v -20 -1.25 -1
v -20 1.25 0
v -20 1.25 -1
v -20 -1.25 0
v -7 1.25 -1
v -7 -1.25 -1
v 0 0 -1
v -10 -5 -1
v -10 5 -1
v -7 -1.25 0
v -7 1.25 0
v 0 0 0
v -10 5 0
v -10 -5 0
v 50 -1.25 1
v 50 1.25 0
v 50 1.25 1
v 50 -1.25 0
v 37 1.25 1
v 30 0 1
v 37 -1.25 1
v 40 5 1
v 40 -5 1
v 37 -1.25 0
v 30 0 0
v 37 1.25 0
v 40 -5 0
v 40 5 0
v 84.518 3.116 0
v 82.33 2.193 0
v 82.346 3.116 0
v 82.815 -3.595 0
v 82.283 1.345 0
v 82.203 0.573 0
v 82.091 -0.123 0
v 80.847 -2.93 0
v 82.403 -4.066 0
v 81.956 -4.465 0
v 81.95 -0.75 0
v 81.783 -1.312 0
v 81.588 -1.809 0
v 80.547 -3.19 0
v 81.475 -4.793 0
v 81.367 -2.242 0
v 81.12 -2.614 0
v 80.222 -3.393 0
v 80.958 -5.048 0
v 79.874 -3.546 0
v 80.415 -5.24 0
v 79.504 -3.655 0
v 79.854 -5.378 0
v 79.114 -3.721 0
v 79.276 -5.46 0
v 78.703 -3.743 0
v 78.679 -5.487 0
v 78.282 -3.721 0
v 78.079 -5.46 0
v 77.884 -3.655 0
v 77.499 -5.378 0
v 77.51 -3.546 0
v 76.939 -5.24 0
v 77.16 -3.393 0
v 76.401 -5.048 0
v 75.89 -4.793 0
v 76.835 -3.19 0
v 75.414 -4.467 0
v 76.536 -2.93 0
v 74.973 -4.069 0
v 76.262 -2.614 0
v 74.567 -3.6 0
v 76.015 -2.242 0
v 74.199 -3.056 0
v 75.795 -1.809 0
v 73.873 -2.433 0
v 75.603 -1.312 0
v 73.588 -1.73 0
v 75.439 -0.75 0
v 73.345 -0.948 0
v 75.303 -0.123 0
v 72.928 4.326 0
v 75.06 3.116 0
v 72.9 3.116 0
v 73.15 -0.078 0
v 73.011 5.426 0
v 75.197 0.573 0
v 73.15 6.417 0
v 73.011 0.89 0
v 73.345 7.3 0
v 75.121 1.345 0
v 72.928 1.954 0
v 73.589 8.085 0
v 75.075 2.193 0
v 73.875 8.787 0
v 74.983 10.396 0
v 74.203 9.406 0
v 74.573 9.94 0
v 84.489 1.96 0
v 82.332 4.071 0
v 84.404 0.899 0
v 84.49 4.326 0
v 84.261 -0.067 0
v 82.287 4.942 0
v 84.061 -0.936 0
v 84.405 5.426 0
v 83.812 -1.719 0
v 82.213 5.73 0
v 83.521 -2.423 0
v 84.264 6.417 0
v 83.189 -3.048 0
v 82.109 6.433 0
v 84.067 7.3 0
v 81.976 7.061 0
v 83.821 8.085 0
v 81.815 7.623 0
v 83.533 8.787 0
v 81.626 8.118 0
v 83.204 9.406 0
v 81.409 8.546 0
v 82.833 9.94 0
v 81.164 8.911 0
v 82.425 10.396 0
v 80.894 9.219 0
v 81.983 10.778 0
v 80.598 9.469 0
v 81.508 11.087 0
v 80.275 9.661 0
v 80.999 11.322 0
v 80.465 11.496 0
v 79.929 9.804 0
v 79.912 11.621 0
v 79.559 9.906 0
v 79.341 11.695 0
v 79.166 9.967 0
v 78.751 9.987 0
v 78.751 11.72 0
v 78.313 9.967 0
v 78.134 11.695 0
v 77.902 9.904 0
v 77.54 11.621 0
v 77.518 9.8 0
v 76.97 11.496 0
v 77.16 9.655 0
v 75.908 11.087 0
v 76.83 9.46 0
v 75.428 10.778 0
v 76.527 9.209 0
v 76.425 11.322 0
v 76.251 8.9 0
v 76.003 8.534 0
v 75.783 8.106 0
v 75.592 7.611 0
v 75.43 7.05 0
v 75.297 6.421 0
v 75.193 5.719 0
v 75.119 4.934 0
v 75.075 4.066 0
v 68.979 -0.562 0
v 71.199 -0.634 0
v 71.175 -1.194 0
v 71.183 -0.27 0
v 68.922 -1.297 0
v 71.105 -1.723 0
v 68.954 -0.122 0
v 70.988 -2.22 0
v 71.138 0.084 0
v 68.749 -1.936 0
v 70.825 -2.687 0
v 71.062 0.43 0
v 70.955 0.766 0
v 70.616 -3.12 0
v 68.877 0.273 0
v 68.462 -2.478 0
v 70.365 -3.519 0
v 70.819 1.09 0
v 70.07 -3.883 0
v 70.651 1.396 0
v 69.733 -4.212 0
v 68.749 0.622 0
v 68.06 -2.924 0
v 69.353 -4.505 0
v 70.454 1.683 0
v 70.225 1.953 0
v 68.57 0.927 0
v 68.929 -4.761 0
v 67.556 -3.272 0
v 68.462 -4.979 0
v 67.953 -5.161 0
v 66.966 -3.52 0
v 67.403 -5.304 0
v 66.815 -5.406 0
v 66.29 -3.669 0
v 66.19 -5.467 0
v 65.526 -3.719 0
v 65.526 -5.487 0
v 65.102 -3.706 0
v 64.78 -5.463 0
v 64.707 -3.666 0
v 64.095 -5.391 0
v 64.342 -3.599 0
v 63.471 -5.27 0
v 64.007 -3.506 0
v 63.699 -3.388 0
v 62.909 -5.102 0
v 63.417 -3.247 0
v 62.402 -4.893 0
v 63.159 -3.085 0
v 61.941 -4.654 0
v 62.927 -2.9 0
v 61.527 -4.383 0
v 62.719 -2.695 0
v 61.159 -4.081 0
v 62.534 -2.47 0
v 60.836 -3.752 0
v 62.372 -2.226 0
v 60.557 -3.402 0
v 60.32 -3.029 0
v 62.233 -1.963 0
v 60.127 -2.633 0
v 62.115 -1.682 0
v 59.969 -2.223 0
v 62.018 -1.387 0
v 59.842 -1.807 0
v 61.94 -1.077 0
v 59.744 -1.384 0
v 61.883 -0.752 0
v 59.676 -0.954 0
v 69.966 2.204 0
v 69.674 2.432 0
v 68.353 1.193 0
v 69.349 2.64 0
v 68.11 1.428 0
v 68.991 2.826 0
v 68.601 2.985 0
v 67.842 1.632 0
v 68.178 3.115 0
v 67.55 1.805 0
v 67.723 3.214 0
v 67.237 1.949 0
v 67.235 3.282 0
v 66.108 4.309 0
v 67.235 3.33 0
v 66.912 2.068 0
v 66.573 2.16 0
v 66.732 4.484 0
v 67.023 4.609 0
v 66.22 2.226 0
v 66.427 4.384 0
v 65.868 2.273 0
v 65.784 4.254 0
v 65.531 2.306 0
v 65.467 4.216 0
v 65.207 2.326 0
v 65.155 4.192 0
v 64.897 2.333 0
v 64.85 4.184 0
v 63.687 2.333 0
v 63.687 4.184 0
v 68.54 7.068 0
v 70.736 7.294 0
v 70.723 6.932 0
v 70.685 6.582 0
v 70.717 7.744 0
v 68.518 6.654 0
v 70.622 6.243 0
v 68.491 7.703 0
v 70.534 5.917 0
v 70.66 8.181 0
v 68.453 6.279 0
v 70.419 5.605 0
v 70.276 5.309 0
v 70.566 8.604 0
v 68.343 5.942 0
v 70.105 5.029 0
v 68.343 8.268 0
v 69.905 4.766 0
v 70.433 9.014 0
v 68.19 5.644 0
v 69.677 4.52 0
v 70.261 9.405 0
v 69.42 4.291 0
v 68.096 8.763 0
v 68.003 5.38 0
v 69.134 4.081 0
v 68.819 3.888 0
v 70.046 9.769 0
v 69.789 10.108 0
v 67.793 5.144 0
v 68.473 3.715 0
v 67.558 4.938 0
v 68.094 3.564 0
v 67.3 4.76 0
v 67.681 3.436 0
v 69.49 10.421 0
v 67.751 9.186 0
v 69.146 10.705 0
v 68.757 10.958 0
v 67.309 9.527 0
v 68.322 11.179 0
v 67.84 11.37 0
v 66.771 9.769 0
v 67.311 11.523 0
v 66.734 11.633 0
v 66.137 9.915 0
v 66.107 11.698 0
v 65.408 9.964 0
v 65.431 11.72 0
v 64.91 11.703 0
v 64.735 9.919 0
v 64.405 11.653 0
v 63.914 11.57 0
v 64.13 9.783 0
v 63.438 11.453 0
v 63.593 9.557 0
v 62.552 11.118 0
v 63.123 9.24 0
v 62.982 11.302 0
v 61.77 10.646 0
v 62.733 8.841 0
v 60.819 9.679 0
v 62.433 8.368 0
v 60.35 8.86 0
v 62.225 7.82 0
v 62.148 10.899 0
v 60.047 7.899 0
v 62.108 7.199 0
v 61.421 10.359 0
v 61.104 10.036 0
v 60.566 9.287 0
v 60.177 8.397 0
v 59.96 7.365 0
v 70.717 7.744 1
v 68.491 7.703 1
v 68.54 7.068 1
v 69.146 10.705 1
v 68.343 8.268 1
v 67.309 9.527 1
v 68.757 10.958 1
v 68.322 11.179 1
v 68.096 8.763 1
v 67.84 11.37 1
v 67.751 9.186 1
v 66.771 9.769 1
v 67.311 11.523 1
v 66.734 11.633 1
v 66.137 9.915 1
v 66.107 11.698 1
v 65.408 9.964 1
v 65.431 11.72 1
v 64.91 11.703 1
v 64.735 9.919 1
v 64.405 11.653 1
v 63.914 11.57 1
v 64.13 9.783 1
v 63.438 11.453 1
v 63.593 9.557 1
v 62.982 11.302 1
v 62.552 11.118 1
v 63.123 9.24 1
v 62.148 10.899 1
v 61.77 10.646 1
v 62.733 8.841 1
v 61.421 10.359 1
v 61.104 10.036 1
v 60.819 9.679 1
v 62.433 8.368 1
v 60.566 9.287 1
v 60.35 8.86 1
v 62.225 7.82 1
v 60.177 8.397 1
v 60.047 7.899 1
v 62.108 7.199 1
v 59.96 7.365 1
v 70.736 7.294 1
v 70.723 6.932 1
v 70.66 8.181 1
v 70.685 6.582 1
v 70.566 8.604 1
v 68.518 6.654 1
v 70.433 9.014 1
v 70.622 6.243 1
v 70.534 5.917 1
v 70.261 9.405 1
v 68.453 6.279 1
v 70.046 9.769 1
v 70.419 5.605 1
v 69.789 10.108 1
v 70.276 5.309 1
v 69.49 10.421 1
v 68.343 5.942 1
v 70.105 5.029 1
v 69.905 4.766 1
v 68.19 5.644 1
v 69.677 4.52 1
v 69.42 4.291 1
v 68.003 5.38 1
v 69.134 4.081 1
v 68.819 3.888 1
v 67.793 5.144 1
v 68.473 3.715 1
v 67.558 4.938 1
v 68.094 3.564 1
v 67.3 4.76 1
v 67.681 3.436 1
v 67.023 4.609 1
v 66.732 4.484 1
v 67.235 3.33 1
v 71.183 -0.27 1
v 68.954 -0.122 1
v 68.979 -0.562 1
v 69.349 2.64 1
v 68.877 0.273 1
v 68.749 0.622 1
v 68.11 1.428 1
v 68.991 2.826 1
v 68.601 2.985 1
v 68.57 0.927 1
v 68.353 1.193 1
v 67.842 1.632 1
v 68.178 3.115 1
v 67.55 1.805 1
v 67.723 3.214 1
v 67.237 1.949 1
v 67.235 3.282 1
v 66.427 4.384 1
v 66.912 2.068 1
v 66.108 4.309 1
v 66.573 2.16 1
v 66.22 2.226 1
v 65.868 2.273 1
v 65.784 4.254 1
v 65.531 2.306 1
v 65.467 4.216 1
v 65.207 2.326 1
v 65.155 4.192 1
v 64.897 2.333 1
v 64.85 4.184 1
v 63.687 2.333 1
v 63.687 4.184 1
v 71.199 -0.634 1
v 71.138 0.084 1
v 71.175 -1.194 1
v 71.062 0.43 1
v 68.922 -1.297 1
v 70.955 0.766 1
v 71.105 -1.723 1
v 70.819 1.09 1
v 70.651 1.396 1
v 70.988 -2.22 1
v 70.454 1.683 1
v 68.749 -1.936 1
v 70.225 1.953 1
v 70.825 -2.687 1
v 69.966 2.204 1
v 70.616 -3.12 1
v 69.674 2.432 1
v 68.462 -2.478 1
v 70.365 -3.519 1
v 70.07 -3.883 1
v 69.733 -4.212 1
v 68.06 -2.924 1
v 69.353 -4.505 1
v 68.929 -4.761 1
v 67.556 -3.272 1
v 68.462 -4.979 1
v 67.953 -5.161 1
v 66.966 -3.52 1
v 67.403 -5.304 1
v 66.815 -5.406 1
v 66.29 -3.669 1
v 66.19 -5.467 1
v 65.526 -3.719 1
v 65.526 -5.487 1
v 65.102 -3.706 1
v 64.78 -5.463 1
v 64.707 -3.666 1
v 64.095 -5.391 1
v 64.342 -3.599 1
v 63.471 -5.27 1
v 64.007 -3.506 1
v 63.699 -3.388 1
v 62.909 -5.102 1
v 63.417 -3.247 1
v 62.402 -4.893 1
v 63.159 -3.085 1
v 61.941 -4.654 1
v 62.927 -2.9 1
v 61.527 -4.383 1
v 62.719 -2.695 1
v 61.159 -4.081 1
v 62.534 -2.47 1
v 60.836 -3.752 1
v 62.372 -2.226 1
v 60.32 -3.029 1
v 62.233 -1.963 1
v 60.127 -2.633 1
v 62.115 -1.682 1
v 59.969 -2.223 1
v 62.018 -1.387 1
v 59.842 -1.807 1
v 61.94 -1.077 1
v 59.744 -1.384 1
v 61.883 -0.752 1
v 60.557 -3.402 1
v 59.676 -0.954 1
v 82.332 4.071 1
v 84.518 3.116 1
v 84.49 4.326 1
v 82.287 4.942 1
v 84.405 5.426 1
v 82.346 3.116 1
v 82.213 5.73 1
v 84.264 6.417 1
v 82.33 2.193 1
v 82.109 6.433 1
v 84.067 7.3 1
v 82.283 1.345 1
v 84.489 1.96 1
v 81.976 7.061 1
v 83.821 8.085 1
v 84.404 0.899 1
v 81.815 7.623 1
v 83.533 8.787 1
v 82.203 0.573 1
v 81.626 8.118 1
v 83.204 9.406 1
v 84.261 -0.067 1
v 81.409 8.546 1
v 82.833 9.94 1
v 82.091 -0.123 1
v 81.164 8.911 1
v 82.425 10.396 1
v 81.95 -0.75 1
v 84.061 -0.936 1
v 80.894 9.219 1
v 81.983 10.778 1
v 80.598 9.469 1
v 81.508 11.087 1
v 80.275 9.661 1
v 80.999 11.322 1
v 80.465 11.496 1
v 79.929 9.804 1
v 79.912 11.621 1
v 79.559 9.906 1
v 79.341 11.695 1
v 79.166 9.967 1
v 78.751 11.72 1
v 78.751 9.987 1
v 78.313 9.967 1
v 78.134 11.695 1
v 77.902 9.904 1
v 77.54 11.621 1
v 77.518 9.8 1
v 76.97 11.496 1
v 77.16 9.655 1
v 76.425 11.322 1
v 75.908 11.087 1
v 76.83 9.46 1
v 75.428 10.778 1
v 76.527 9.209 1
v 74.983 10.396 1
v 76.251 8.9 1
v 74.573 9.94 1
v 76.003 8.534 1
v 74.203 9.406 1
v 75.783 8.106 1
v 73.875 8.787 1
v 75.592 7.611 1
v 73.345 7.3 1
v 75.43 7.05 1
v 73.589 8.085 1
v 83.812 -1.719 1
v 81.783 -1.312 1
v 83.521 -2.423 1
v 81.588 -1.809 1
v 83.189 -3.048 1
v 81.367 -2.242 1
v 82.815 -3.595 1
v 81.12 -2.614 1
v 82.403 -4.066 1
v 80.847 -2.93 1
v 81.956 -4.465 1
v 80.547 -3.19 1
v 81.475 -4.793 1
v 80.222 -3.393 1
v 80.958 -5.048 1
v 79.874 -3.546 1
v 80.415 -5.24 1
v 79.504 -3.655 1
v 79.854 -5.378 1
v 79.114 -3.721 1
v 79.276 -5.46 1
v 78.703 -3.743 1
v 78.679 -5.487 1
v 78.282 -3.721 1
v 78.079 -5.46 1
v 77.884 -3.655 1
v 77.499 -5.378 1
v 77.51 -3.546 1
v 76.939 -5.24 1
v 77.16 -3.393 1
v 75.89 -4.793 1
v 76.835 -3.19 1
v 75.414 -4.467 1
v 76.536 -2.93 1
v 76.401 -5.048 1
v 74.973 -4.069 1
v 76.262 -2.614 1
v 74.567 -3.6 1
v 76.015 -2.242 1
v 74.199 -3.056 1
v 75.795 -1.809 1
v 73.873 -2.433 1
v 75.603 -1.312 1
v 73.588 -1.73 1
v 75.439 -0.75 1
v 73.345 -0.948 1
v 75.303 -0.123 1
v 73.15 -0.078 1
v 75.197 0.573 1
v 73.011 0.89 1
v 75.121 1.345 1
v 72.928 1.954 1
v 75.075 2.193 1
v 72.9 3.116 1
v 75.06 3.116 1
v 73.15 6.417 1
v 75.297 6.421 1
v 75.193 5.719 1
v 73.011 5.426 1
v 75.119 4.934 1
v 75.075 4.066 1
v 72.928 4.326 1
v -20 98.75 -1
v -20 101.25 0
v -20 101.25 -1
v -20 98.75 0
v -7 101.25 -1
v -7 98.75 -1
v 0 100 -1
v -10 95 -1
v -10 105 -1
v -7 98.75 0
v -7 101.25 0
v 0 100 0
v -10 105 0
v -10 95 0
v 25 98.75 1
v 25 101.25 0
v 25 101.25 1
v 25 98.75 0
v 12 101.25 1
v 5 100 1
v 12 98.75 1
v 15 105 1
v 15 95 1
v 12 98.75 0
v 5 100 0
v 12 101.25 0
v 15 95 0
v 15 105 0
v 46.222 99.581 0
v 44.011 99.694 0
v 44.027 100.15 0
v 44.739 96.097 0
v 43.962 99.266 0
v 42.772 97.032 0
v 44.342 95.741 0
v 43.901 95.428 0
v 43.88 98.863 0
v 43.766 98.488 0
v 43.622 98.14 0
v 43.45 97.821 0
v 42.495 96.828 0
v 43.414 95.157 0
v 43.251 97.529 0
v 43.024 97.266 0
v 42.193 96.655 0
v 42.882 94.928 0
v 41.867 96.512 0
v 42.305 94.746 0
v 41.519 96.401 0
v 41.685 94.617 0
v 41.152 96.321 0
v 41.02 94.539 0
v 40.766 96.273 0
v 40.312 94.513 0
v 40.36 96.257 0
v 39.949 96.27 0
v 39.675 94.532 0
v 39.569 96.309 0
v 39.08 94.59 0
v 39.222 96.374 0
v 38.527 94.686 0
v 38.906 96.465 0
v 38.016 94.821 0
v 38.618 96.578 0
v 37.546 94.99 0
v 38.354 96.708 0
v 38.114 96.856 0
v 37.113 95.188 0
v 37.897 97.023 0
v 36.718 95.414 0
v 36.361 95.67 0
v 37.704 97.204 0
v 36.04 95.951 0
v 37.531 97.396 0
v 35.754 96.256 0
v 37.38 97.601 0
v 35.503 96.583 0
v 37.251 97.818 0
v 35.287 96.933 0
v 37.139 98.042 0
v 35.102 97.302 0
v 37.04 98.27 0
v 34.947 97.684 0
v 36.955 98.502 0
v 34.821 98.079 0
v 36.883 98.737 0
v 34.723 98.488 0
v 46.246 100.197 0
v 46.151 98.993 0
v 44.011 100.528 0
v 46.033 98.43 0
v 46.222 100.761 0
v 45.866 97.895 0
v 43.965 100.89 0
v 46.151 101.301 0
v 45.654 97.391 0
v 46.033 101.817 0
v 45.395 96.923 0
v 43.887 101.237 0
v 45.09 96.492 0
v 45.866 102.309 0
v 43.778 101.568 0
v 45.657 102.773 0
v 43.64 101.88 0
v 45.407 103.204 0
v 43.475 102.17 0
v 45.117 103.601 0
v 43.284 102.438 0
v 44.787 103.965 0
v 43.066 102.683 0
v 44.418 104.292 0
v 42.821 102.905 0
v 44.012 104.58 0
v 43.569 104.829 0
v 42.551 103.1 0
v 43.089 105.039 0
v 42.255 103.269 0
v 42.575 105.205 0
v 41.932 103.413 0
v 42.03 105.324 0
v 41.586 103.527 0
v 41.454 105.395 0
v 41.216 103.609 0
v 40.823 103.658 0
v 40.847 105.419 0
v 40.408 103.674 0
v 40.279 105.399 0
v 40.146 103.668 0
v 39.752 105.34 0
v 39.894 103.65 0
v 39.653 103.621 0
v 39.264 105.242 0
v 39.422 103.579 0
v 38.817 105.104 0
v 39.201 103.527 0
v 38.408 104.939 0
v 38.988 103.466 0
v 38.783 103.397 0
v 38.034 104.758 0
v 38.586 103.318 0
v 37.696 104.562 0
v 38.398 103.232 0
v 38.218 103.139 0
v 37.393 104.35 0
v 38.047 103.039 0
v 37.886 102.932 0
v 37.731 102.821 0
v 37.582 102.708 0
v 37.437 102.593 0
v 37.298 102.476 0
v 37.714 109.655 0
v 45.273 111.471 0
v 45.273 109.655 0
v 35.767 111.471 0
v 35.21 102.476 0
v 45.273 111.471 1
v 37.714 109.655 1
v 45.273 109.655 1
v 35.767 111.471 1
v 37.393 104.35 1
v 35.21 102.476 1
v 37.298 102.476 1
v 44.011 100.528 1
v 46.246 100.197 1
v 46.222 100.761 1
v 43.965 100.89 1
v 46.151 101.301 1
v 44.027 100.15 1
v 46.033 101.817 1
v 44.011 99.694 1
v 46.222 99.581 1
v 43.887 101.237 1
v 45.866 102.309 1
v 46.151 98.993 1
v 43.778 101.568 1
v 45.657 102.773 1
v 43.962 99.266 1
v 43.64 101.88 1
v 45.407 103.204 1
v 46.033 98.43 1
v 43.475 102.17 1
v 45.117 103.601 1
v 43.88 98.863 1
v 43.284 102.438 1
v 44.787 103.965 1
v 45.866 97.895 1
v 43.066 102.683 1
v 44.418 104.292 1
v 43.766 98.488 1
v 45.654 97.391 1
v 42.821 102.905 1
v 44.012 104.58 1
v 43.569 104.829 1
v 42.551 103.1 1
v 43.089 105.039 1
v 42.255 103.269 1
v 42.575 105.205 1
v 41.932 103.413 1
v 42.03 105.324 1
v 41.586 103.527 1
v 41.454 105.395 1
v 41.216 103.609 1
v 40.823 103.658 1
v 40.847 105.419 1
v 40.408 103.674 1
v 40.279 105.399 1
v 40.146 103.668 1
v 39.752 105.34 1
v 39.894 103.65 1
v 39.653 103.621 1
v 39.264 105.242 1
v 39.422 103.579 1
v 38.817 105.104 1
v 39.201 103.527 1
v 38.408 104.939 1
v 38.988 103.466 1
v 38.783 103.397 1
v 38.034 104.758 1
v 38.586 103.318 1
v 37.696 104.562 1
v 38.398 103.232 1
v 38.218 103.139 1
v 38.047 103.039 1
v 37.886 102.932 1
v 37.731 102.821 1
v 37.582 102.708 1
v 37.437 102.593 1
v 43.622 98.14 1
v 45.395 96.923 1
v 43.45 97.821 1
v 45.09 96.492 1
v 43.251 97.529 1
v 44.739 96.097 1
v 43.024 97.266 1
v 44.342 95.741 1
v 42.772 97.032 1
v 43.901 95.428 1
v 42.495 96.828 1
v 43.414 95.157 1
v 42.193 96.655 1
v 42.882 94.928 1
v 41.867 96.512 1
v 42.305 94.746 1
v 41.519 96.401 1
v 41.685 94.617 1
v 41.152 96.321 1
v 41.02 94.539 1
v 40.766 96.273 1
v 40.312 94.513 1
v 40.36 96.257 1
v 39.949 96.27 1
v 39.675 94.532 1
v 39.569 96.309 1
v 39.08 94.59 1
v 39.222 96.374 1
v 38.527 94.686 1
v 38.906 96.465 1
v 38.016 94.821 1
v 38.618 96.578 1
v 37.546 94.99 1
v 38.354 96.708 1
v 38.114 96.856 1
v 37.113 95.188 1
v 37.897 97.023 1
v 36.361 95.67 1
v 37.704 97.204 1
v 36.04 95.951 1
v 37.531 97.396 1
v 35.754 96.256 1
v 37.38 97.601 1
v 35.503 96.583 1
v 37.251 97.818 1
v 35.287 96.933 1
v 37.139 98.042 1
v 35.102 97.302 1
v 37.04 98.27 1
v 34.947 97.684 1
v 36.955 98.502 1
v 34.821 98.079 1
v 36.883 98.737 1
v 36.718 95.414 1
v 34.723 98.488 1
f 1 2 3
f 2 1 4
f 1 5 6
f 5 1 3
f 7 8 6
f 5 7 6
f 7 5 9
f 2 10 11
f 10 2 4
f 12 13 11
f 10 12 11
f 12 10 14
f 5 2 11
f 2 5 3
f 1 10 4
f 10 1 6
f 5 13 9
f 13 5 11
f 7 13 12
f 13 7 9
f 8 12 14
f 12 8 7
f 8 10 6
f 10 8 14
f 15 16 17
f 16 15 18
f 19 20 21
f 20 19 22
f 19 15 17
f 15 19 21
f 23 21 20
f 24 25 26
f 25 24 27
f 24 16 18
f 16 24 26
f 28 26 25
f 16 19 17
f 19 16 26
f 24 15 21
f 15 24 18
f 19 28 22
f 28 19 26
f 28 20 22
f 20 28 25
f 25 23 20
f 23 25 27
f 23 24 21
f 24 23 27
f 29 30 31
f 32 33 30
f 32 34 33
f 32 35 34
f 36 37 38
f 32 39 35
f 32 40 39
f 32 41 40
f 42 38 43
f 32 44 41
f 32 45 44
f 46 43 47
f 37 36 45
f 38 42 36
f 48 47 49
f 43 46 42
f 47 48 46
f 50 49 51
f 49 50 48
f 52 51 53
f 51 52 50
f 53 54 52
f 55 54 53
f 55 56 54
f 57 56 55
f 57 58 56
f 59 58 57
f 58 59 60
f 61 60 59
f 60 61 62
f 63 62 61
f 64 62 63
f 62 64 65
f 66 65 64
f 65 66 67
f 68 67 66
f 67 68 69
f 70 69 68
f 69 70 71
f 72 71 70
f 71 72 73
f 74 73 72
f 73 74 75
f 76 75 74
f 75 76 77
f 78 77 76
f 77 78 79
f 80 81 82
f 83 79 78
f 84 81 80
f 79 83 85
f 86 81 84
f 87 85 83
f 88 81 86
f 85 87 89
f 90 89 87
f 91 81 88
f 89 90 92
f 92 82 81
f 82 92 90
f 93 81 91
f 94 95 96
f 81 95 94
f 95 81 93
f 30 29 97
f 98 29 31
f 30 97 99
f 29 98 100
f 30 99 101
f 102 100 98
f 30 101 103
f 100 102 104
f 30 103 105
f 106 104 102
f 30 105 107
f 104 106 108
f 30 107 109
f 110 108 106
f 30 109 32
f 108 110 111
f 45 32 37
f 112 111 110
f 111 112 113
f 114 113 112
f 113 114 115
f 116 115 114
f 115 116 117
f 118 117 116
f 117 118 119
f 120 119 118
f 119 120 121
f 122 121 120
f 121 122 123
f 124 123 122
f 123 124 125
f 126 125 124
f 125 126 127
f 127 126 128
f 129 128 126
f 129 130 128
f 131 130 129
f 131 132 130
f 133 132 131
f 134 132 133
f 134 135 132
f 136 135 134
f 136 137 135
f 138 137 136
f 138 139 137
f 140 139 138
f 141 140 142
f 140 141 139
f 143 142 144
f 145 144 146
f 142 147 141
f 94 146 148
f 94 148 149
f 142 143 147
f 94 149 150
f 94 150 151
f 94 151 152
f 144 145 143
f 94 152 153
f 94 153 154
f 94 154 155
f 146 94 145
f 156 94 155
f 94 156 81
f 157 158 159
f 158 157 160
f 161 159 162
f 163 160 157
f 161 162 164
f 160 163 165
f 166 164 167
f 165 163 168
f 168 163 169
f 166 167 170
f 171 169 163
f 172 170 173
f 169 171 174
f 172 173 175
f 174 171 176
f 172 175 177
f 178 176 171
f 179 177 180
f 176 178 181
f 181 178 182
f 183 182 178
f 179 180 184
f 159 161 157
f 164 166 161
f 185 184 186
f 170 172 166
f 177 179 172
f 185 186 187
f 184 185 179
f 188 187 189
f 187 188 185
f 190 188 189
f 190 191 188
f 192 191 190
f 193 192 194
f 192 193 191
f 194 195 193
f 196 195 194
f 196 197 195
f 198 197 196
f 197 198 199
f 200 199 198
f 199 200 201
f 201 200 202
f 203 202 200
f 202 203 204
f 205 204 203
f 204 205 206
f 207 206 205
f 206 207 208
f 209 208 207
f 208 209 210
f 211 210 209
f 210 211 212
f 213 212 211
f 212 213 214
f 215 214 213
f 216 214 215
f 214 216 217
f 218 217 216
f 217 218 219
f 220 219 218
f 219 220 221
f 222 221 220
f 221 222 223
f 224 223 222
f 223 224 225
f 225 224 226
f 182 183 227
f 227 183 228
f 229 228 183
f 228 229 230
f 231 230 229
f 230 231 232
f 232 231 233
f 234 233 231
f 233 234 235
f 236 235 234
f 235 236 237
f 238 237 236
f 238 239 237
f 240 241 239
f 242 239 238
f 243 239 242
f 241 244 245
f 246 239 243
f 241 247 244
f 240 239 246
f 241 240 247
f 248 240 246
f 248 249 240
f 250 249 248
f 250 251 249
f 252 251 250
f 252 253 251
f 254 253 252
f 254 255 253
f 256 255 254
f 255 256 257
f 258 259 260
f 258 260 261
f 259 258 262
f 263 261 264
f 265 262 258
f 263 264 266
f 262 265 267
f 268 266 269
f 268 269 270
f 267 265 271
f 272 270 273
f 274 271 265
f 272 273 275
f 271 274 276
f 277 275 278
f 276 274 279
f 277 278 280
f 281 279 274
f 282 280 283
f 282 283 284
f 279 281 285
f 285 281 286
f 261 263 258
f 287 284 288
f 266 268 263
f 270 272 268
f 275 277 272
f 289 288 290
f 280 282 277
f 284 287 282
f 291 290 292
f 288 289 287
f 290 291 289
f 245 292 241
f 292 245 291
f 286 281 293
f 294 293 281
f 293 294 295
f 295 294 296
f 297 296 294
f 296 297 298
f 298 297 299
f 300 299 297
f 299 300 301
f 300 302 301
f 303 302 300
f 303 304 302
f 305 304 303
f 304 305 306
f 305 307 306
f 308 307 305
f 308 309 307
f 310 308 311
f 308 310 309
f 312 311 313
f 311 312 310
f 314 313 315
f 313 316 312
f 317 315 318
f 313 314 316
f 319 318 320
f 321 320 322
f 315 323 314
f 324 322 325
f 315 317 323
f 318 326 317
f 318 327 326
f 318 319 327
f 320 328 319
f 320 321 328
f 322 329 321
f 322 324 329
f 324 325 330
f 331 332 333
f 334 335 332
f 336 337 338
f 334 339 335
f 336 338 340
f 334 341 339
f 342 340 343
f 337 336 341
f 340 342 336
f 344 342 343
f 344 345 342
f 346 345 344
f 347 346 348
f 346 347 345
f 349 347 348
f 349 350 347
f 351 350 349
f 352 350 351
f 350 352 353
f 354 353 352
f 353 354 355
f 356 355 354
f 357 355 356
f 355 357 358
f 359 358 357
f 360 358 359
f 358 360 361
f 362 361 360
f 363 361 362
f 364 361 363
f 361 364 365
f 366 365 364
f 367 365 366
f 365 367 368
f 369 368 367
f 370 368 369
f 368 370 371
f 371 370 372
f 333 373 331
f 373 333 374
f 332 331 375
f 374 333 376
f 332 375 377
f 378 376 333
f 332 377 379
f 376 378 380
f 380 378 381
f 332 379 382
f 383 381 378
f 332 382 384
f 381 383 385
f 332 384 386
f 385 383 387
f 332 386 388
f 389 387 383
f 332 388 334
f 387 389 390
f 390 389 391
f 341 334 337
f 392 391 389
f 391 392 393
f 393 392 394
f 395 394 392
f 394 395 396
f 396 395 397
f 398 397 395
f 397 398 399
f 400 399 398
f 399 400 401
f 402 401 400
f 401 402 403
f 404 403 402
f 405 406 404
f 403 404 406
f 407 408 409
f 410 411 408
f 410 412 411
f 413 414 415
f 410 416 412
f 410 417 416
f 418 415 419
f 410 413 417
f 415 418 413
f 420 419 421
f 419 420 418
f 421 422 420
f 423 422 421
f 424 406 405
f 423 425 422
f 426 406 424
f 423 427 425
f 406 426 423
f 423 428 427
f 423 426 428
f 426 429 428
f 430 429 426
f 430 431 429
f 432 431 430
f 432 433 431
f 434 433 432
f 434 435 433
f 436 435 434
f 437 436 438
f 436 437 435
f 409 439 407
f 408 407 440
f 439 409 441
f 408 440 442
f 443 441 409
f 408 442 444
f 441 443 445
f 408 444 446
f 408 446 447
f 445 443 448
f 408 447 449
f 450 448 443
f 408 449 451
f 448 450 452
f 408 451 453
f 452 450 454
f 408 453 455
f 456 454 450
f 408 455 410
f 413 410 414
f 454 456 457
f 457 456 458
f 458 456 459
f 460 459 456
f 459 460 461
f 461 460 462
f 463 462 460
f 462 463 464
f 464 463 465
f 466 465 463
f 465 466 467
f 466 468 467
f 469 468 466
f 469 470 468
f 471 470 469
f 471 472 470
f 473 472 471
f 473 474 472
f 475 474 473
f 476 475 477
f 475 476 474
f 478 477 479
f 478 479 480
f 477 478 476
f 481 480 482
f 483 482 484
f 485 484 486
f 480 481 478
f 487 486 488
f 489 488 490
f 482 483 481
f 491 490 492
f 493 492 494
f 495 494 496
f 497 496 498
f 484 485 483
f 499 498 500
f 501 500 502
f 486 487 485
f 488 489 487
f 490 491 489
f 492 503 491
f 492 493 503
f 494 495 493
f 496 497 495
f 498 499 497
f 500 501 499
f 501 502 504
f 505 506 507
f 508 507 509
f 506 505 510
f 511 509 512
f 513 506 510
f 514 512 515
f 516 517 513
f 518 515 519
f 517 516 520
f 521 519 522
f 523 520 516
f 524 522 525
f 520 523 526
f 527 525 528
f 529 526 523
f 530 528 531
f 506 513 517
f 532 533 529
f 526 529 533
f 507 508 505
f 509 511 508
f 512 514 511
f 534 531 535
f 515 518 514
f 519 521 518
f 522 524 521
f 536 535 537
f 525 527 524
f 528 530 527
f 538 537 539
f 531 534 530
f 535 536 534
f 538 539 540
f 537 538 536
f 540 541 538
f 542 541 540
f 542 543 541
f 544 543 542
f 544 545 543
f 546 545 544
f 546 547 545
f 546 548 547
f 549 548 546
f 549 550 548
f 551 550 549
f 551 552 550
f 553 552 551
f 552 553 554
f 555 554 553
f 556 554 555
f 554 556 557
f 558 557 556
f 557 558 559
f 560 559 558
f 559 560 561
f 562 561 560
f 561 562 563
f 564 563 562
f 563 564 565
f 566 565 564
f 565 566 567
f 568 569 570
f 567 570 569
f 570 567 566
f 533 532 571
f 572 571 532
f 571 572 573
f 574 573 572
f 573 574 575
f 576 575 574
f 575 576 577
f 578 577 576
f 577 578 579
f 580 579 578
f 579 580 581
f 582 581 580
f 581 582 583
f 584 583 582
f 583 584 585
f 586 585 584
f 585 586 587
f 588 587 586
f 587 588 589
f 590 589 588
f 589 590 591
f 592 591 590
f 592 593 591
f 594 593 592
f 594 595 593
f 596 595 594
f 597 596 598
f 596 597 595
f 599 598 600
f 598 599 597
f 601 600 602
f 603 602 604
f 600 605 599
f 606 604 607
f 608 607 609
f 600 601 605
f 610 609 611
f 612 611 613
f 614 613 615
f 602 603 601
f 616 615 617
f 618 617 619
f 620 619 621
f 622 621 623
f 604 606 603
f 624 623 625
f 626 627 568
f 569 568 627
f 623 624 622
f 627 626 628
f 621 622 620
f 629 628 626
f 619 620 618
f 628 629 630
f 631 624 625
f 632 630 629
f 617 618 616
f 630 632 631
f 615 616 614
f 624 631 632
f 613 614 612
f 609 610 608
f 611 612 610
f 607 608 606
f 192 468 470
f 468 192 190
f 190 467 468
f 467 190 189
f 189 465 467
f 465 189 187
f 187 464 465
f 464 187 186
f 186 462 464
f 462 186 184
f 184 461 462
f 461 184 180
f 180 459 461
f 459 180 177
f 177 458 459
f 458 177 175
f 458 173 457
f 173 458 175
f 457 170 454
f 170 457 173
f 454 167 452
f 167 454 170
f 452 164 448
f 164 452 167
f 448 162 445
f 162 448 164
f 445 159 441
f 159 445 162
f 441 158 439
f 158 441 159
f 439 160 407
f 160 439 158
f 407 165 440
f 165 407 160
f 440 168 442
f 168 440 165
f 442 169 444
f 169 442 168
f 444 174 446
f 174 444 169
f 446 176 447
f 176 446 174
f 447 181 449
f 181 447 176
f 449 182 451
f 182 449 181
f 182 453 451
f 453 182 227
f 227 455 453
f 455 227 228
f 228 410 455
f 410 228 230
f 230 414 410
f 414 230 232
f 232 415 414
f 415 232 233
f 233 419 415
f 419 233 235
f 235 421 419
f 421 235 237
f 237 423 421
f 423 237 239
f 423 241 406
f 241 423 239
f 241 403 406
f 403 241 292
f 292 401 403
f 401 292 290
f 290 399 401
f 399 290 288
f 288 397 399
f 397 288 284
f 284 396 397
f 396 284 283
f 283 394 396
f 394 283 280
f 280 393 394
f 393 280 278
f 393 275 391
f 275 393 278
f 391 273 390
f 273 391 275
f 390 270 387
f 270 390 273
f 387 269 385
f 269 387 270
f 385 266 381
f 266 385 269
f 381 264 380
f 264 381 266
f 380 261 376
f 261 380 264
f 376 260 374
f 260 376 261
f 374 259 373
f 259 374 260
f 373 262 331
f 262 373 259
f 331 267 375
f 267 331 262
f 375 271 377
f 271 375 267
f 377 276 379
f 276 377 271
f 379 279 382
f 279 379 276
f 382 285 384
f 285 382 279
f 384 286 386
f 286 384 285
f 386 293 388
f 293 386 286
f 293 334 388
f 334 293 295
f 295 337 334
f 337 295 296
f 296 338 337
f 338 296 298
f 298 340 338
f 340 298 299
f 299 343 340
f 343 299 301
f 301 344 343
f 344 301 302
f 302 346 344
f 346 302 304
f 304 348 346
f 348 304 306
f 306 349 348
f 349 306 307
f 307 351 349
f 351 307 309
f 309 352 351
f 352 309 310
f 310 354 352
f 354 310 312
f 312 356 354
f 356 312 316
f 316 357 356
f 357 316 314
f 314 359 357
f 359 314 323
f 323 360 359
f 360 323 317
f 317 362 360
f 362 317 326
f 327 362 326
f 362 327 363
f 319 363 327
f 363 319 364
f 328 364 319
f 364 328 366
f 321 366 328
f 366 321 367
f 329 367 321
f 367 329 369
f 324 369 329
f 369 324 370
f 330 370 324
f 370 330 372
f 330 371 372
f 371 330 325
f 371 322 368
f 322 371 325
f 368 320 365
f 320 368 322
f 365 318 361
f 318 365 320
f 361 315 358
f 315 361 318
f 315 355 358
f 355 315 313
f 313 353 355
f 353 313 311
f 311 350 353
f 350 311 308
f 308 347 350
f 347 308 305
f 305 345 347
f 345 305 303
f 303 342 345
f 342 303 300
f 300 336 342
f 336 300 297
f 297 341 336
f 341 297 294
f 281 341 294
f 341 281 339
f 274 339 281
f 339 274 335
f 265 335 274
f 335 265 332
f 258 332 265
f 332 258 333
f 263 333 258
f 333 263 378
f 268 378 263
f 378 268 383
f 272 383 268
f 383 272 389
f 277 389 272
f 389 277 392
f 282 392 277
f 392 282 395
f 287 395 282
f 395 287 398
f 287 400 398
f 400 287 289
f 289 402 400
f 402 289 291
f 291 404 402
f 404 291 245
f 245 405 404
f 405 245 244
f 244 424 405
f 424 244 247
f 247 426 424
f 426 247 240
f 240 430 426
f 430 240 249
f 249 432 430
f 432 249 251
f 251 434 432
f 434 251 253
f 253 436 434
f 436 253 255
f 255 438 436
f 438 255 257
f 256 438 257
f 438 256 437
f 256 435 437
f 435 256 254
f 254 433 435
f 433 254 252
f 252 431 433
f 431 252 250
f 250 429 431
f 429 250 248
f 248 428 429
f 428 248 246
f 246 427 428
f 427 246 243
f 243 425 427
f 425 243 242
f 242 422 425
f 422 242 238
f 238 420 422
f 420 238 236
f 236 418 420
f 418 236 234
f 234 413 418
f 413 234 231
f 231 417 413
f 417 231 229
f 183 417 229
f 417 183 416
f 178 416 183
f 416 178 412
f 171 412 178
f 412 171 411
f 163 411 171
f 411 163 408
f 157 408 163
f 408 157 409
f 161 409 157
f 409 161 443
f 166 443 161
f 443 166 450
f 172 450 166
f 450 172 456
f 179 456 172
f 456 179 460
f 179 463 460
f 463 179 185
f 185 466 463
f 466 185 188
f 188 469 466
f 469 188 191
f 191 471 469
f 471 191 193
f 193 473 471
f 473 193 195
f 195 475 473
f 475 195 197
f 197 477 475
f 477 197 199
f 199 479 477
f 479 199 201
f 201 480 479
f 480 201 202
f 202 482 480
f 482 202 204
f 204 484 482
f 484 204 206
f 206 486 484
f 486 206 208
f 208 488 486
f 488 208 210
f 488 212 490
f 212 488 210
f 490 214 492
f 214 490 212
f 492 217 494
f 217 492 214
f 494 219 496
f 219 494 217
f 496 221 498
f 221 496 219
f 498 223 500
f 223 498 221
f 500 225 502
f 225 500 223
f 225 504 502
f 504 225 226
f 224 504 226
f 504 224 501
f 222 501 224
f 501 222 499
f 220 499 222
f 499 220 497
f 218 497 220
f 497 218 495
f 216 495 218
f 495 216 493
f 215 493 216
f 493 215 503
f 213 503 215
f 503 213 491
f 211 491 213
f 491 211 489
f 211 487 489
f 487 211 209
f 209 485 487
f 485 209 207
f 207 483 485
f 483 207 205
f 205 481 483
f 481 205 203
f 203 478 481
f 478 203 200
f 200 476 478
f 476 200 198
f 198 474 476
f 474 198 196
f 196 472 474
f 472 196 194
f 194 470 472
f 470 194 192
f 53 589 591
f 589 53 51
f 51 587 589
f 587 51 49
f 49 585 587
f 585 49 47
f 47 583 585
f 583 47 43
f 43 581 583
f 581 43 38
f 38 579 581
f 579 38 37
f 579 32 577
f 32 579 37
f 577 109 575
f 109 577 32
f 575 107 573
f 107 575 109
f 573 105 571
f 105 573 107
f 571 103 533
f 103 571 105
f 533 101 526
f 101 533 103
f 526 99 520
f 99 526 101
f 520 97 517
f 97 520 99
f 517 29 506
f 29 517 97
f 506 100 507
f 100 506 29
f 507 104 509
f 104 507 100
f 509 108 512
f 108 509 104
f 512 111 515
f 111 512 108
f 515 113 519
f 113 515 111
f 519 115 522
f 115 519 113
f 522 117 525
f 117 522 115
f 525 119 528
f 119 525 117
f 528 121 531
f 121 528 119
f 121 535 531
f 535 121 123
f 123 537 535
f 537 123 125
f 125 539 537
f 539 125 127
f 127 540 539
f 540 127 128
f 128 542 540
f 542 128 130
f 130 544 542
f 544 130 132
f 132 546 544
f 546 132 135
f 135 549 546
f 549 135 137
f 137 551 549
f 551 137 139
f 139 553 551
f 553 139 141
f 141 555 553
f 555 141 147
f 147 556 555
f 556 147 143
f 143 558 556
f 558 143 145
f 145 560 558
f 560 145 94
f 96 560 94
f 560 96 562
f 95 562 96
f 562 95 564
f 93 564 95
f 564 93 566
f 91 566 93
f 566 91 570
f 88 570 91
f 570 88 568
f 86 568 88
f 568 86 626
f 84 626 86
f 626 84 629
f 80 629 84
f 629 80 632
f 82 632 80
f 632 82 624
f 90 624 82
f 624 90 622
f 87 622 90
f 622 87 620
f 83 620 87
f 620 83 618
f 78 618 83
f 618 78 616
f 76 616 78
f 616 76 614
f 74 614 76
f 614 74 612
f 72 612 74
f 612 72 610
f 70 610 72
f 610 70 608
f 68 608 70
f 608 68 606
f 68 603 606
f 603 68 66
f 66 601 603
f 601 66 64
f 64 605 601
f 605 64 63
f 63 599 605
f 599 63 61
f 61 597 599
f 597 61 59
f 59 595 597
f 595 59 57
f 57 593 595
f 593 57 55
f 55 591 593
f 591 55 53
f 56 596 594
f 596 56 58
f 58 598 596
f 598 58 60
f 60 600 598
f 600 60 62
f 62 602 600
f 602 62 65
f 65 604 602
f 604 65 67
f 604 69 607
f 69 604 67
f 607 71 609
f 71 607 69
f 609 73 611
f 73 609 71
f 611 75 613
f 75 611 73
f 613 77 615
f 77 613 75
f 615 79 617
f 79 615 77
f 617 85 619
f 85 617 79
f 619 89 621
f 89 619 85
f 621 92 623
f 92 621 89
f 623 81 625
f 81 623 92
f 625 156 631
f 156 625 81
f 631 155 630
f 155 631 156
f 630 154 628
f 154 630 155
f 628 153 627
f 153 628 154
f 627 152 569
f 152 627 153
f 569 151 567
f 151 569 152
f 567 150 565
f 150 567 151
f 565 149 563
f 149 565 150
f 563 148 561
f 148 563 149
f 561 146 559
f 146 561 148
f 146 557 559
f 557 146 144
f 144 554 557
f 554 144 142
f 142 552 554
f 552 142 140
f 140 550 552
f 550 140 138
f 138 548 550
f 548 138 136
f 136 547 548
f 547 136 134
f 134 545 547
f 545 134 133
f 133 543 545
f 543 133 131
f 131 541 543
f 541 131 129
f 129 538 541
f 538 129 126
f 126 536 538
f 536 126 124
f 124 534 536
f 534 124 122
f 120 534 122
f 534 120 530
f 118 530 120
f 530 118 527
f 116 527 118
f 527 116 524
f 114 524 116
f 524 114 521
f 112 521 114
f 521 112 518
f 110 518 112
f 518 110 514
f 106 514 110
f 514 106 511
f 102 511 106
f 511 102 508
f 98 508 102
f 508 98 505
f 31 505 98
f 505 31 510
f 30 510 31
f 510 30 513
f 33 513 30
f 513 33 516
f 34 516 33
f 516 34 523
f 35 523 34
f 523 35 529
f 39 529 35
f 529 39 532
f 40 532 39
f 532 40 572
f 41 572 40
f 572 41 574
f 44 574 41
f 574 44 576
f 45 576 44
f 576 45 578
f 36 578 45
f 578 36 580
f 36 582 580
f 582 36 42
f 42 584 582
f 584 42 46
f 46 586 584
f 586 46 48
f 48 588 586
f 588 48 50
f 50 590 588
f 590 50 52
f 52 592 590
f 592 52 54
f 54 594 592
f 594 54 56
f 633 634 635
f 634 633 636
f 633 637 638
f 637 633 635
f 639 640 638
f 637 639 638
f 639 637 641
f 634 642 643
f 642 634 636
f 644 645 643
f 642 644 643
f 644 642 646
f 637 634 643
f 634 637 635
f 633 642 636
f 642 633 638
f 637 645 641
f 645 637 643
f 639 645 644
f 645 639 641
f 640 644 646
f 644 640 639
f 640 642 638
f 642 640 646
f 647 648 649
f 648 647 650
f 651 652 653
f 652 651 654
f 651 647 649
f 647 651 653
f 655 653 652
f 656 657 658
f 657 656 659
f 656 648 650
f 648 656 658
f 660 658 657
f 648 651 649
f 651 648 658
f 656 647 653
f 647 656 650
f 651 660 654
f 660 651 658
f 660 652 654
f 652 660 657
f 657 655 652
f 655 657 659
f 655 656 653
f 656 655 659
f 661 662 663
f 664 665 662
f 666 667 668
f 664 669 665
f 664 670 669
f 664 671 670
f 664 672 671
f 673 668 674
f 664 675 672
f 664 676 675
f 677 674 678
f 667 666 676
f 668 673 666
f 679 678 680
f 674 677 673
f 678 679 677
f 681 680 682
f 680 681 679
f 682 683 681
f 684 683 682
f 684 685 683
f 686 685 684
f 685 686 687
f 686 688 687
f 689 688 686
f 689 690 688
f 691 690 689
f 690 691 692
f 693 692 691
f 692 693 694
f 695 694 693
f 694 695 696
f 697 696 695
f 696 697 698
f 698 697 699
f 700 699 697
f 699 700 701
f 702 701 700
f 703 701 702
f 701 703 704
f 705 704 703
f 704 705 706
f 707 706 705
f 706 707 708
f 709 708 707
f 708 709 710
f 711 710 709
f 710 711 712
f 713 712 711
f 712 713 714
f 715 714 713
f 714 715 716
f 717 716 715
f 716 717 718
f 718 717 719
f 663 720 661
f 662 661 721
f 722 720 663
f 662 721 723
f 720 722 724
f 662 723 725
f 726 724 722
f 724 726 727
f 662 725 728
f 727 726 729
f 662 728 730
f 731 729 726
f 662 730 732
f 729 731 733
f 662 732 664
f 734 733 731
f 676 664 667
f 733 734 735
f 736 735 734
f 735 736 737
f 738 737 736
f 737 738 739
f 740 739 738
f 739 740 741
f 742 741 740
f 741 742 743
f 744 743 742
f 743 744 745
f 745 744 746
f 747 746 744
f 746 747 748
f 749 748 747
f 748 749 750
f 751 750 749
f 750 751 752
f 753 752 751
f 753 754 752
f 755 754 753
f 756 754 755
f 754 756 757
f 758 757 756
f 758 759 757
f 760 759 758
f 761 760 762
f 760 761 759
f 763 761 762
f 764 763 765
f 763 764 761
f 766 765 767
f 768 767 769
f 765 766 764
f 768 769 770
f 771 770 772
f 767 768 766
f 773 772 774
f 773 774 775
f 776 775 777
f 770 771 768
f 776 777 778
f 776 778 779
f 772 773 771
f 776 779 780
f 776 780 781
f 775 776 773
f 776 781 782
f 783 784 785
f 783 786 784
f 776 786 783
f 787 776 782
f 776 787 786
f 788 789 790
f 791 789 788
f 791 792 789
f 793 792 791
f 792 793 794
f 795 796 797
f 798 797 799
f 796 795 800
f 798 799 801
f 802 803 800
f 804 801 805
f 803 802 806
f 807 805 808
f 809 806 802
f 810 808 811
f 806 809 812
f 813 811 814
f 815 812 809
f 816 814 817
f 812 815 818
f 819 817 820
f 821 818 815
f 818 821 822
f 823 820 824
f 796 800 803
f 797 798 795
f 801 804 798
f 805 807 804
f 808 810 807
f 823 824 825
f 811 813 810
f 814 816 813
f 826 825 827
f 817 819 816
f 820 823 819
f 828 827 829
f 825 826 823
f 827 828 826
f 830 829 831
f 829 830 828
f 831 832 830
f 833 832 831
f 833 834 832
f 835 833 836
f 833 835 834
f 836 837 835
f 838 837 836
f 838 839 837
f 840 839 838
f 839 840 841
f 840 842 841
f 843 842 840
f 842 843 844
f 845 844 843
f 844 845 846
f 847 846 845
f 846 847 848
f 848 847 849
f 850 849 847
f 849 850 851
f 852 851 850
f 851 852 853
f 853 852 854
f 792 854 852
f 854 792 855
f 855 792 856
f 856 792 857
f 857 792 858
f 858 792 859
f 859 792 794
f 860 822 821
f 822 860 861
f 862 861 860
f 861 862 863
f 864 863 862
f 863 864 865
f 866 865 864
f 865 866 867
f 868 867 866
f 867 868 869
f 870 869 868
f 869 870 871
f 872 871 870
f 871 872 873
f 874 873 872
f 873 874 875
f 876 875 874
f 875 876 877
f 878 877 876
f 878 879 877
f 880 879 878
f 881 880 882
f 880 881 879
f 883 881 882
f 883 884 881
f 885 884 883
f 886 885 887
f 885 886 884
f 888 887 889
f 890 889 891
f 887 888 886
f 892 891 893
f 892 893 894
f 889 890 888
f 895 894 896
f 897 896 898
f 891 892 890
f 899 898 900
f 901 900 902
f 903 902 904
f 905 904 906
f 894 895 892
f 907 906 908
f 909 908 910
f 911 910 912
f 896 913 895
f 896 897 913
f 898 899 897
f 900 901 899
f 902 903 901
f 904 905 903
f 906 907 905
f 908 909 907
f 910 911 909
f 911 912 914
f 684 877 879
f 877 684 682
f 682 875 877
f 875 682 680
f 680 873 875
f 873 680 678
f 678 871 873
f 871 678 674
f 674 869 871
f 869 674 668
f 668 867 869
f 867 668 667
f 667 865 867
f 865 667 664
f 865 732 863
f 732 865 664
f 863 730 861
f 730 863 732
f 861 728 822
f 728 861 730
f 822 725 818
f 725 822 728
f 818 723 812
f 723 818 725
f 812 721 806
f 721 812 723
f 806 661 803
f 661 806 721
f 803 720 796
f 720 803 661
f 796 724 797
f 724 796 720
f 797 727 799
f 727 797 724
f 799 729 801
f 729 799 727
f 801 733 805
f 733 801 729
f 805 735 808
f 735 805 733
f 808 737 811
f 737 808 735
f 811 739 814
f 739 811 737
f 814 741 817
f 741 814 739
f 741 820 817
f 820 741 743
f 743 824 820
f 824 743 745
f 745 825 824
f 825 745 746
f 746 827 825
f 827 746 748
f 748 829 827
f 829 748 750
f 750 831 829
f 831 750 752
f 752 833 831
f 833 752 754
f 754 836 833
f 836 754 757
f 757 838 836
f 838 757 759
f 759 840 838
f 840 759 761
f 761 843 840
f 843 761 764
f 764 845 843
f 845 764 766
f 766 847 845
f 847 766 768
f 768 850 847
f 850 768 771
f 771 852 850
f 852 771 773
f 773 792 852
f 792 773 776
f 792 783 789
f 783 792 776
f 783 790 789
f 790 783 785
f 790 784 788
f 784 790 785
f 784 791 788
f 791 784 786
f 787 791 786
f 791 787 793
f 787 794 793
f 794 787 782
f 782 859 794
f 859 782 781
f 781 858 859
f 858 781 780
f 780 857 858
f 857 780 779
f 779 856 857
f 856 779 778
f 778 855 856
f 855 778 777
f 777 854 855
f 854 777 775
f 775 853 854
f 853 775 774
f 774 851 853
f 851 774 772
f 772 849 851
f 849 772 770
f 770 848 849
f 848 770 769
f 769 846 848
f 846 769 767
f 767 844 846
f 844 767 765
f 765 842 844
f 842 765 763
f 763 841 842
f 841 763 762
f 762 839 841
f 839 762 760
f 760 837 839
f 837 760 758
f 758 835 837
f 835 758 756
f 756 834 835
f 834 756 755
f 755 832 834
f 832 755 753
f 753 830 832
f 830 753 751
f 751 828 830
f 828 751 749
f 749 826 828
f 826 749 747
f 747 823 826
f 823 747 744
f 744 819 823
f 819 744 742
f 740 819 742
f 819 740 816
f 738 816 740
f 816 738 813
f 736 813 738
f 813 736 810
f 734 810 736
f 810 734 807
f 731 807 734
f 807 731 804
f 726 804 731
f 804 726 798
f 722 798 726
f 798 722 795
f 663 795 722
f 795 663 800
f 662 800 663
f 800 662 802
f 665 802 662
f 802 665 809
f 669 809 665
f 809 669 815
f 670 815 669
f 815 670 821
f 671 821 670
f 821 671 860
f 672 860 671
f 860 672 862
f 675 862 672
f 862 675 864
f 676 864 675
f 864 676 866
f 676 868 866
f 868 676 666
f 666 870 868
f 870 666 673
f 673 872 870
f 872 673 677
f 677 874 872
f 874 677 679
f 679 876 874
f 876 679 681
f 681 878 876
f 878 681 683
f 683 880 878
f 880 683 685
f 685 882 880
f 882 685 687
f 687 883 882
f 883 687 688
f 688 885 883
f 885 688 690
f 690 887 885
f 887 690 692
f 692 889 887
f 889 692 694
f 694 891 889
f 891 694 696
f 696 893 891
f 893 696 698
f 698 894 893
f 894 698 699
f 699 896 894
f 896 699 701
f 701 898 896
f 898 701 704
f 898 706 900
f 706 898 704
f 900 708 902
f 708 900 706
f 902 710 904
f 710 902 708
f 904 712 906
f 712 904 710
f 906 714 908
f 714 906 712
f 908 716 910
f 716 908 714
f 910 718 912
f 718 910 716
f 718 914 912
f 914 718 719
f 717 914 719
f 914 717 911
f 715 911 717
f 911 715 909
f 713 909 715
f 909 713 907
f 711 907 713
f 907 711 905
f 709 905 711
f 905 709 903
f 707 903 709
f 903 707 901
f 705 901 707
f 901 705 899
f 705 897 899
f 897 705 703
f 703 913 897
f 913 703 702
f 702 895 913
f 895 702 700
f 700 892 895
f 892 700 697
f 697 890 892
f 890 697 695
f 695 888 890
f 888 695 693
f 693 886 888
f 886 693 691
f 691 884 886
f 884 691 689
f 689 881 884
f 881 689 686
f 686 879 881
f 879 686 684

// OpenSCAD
// file: ../drawing_sheet_sizes.scad
// drawing_sheet_sizes.scad
sheet_sizes = [
    // ISO 216 (A-Series)
    ["A0", [841, 1189]],
    ["A1", [594, 841]],
    ["A2", [420, 594]],
    ["A3", [297, 420]],
    ["A4", [210, 297]],

    // ANSI Standard (U.S.)
    ["ANSI_A", [216, 279]], // 8.5 × 11 inches
    ["ANSI_B", [279, 432]], // 11 × 17 inches
    ["ANSI_C", [432, 559]], // 17 × 22 inches
    ["ANSI_D", [559, 864]], // 22 × 34 inches
    ["ANSI_E", [864, 1118]], // 34 × 44 inches

    // Architectural Sizes (U.S.)
    ["ARCH_A", [229, 305]], // 9 × 12 inches
    ["ARCH_B", [305, 457]], // 12 × 18 inches
    ["ARCH_C", [457, 610]], // 18 × 24 inches
    ["ARCH_D", [610, 914]], // 24 × 36 inches
    ["ARCH_E", [914, 1219]], // 36 × 48 inches

    // ASME Y14.1 (Engineering Drawings)
    ["ENG_A", [216, 279]], // Same as ANSI A
    ["ENG_B", [279, 432]], // Same as ANSI B
    ["ENG_C", [432, 559]], // Same as ANSI C
    ["ENG_D", [559, 864]], // Same as ANSI D
    ["ENG_E", [864, 1118]], // Same as ANSI E

    // JIS B-Series (Japan)
    ["B0", [1030, 1456]],
    ["B1", [728, 1030]],
    ["B2", [515, 728]],
    ["B3", [364, 515]],
    ["B4", [257, 364]],
];
// file: ../src/dd_titleblock.scad
/**
 * @file dd_titleblock.scad
 * @brief Functions for creating title blocks on drawing sheets.
 * @details This file contains functions for creating title blocks on drawing sheets. The titleblock function creates a
 * title block with lines, descriptions, and details based on the given parameters.
 * @copyright (c) 2021 Don Smiley, (c) 2025 Cameron K. Brooks
 */

/*
 * titleblock(lines, descs, details, color, text_color)
 * Creates a title block for a drawing sheet, including lines, descriptions, and details.
 * Parameters:
 * - lines: Array defining the lines in the title block with format:
 *           [[startx, starty, orientation, length, width], ...]
 *           - orientation: Use DIM_HORZ or DIM_VERT for horizontal/vertical lines.
 *           - width: Factor to scale the line width beyond DIM_LINE_WIDTH.
 * - descs: Array defining descriptive text blocks with format:
 *           [[startx, starty, orientation, text, size], ...]
 *           - size: Factor to scale font size beyond DIM_FONTSCALE.
 * - details: Array defining part-specific details with format:
 *           [[startx, starty, orientation, text, size], ...]
 * - color: Line color.
 * - text_color: Text color.
 * Behavior:
 * - Draws lines and places text (descriptions and details) at specified positions.
 * - Handles horizontal and vertical orientations for text and lines.
 */
module titleblock(lines, descs, details, color = DEF_LINE_COLOR, text_color = DEF_TEXT_COLOR) {
    DIM_FONTSCALE = DIM_LINE_WIDTH * 0.7;

    for (line = lines)
    {
        color(color) translate([line[0] * DIM_LINE_WIDTH, line[1] * DIM_LINE_WIDTH, 0]) if (line[2] == DIM_VERT) {
                // a vertical line runs down from its start point, and line() draws upward
                translate([0, -line[3] * DIM_LINE_WIDTH, 0])
                    line(length=line[3] * DIM_LINE_WIDTH, width=DIM_LINE_WIDTH * line[4], vert=true);
            } else {
                line(length=(line[3] + 1) * DIM_LINE_WIDTH, width=DIM_LINE_WIDTH * line[4]);
            }
    }

    color(text_color) {
        for (line = descs)
        {
            translate([line[0] * DIM_LINE_WIDTH, line[1] * DIM_LINE_WIDTH, 0]) if (line[2] == DIM_VERT) {
                rotate([0, 0, 90])
                    linear_extrude(height=DIM_LINE_HEIGHT) scale([DIM_FONTSCALE * line[4], DIM_FONTSCALE * line[4]]) text(line[3]);
            } else {
                linear_extrude(height=DIM_LINE_HEIGHT) scale([DIM_FONTSCALE * line[4], DIM_FONTSCALE * line[4]]) text(line[3]);
            }
        }

        for (line = details)
        {
            translate([line[0] * DIM_LINE_WIDTH, line[1] * DIM_LINE_WIDTH, 0]) if (line[2] == DIM_VERT) {
                rotate([0, 0, 90])
                    linear_extrude(height=DIM_LINE_HEIGHT) scale([DIM_FONTSCALE * line[4], DIM_FONTSCALE * line[4]]) text(line[3]);
            } else {
                linear_extrude(height=DIM_LINE_HEIGHT) scale([DIM_FONTSCALE * line[4], DIM_FONTSCALE * line[4]]) text(line[3]);
            }
        }
    }
}
// file: ../src/dd_sheet.scad
/**
 * @file dd_sheet.scad
 * @brief Functions for drawing sheets from standard sizes and grid patterns.
 * @details This file contains functions for drawing sheets with standard sizes and grid patterns. The draw_sheet
 * function can draw a sheet boundary based on given dimensions or a standard sheet symbol with a grid or dot pattern.
 * @copyright (c) 2025 Cameron K. Brooks, (c) 2021 Don Smiley
 */

include <../drawing_sheet_sizes.scad>;

/*
 * draw_sheet(length, height, sheet_symbol, grid_type, line_width, color)
 * Draws a sheet boundary based on given dimensions or a standard sheet symbol and adds a grid or dot pattern if
 * specified. Parameters:
 * - length: Length of the sheet (overridden if sheet_symbol is provided).
 * - height: Height of the sheet (overridden if sheet_symbol is provided).
 * - sheet_symbol: Standard sheet size identifier (e.g., "A4", "ANSI_B").
 * - grid_type: "None", "Dot", or "Grid" to specify the background pattern.
 * - line_width: Thickness of the sheet boundary lines.
 * - color: Optional parameter to set the frame's color.
 */
module draw_sheet(
    length = undef,
    height = undef,
    sheet_symbol = undef,
    line_width = DIM_LINE_WIDTH * 2,
    line_height = DIM_LINE_HEIGHT,
    grid_type = "None",
    grid_dim = DIM_GRID_SPACING,
    grid_line_width = DIM_LINE_WIDTH,
    color = DEF_LINE_COLOR
) {
    // If a sheet symbol is provided, it overrides length and height using the sheet_sizes array.
    // An assignment inside an if block is local to that block, so the size is resolved here.
    matches = is_undef(sheet_symbol) ? [] : [for (sheet = sheet_sizes) if (sheet[0] == sheet_symbol) sheet[1]];
    sheet_length = len(matches) > 0 ? matches[0][0] : length;
    sheet_height = len(matches) > 0 ? matches[0][1] : height;

    if (!is_undef(sheet_symbol)) {
        echo("Looking for sheet symbol: ", sheet_symbol);

        if (len(matches) > 0) {
            echo("Match found for sheet symbol: ", sheet_symbol, " Dimensions: ", matches[0]);
        } else {
            echo("Warning: Sheet symbol '", sheet_symbol, "' not found.");
        }
    }

    // Proceed only if length and height are defined
    if (!is_undef(sheet_length) && !is_undef(sheet_height)) {
        // Draw the grid or dots before drawing the frame to ensure it's in the background
        draw_frame(sheet_length, sheet_height, line_width, line_height, color);
        translate([0, 0, -DIM_LINE_WIDTH])
            draw_grid(sheet_length, sheet_height, grid_type, grid_dim, grid_line_width, line_height, "lightgray");
    } else {
        echo("Warning: Invalid dimensions. Frame not drawn.");
    }
}

module draw_frame(length, height, line_width = DIM_LINE_WIDTH, line_height = DIM_LINE_HEIGHT, color = DEF_LINE_COLOR) {
    /*
     * draw_frame(length, height, line_width, color)
     * Draws the rectangular frame of a sheet with specified dimensions and line width.
     * Parameters:
     * - length: Length of the sheet frame.
     * - height: Height of the sheet frame.
     * - line_width: Thickness of the frame lines.
     * - color: Optional parameter to set the frame's color.
     * Behavior:
     * - Creates a rectangular frame with horizontal and vertical lines.
     */
    color(color) {
        // Bottom horizontal line
        line(length=length, width=line_width, height=line_height);

        // Top horizontal line
        translate([0, height, 0]) line(length=length, width=line_width, height=line_height);

        // Left vertical line
        translate([line_width / 2, line_width / 2, 0])
            line(length=height - line_width, width=line_width, height=line_height, vert=true);

        // Right vertical line
        translate([length - line_width / 2, line_width / 2, 0])
            line(length=height - line_width, width=line_width, height=line_height, vert=true);
    }
}

module draw_grid(
    length,
    height,
    type = "None",
    grid_spacing = DIM_GRID_SPACING,
    line_width = DIM_LINE_WIDTH / 2,
    line_height = DIM_LINE_HEIGHT,
    color = "lightgray"
) {
    /*
     * draw_grid(length, height, type, grid_spacing, line_width, color)
     * Adds a grid or dot pattern to the sheet.
     * Parameters:
     * - length: Length of the sheet.
     * - height: Height of the sheet.
     * - type: "None", "Dot", or "Grid" to specify the background pattern.
     * - grid_spacing: Distance between grid lines or dots.
     * - line_width: Thickness of grid lines (ignored for dots).
     * - color: Color of the grid lines or dots.
     */

    if (type == "Grid") {
        color(color) {
            // Draw vertical grid lines
            for (x = [0:grid_spacing:length])
            {
                translate([x, 0, 0]) line(length=height, width=line_width, height=line_height, vert=true);
            }

            // Draw horizontal grid lines
            for (y = [0:grid_spacing:height])
            {
                translate([0, y, 0]) line(
                        length=length, width=line_width, height=line_height,
                        left_arrow=false, right_arrow=false
                    );
            }
        }
    } else if (type == "Dot") {
        color(color) {
            // Define dot size
            dot_size = line_width; // You can adjust the dot size as needed

            for (x = [0:grid_spacing:length])
            {
                for (y = [0:grid_spacing:height])
                {
                    translate([x, y, 0]) sphere(r=dot_size, $fn=12);
                }
            }
        }
    } else {
        echo("No grid or dot pattern selected.");
    }
}
// file: ../dimdraft.scad
// ----- Variables -----
DOC_SCALING_FACTOR = is_undef(SCALING_FACTOR) ? 1 : SCALING_FACTOR;

// Line and text related constants

DIM_LINE_WIDTH_NOMINAL = 0.025; // Nominal line width
DIM_SPACE_NOMINAL = 0.1; // Nominal spacing value for line spacing adjustments
DIM_LINE_HEIGHT_NOMINAL = 0.01; // Nominal height of lines

DIM_LINE_WIDTH =
    is_undef(LINE_WIDTH) ? DIM_LINE_WIDTH_NOMINAL * DOC_SCALING_FACTOR : LINE_WIDTH; // Width of the dimension lines
DIM_LINE_HEIGHT =
    is_undef(HEIGHT) ? DIM_LINE_HEIGHT_NOMINAL * DOC_SCALING_FACTOR : HEIGHT; // Height of the dimension lines
DIM_SPACE =
    is_undef(SPACE) ? DIM_SPACE_NOMINAL * DOC_SCALING_FACTOR : SPACE; // Spacing value for line spacing adjustments

DEF_LINE_COLOR = is_undef(LINE_COLOR) ? "black" : LINE_COLOR; // Default line color
DEF_TEXT_COLOR = is_undef(TEXT_COLOR) ? "black" : TEXT_COLOR; // Default text color

// ----- Dependent Constants -----
// Hole center constant
DIM_HOLE_CENTER = DIM_LINE_WIDTH * 6; // Size of the cross within a circle
// Text is drawn at OpenSCAD's default size of 10 and scaled by DIM_FONTSCALE.
// Its height is 7 line widths unless TEXT_SIZE is set.
DIM_FONTSCALE = is_undef(TEXT_SIZE) ? DIM_LINE_WIDTH * 0.7 : TEXT_SIZE / 10;
DIM_TEXT_SIZE = DIM_FONTSCALE * 10; // Height of the text

DIM_GRID_SPACING = 50; // Default grid spacing value, standard for most drawings (i.e. ISO, ANSI, etc.)

// ----- Constants -----
// Dimension positioning constants
DIM_CENTER = 0;
DIM_LEFT = 1;
DIM_RIGHT = 2;
DIM_OUTSIDE = 3;

// Orientation constants
DIM_HORZ = 0;
DIM_VERT = 1;

// Corner positioning constants
DIM_UPPER_LEFT = 0;
DIM_UPPER_RIGHT = 1;
DIM_LOWER_LEFT = 2;
DIM_LOWER_RIGHT = 3;

// Offset value for hole length
ZFITE = 0.05; // Added to the hole length to extend past the surface of the cube

include <src/dd_dimlines.scad>;
include <src/dd_sheet.scad>;
include <src/dd_titleblock.scad>;
// main file
// A centred dimension too short for its label must not produce negative-size geometry.
// At SCALING_FACTOR = 100 the label "30" is about 27 wide, so neither of these has room for it between arrows.
// expect: text = "30"
// expect: text = "5"
// reject: size = \[-
SCALING_FACTOR = 100;
include <../dimdraft.scad>

dimensions(length=30);
translate([0, 100, 0]) dimensions(length=5);
